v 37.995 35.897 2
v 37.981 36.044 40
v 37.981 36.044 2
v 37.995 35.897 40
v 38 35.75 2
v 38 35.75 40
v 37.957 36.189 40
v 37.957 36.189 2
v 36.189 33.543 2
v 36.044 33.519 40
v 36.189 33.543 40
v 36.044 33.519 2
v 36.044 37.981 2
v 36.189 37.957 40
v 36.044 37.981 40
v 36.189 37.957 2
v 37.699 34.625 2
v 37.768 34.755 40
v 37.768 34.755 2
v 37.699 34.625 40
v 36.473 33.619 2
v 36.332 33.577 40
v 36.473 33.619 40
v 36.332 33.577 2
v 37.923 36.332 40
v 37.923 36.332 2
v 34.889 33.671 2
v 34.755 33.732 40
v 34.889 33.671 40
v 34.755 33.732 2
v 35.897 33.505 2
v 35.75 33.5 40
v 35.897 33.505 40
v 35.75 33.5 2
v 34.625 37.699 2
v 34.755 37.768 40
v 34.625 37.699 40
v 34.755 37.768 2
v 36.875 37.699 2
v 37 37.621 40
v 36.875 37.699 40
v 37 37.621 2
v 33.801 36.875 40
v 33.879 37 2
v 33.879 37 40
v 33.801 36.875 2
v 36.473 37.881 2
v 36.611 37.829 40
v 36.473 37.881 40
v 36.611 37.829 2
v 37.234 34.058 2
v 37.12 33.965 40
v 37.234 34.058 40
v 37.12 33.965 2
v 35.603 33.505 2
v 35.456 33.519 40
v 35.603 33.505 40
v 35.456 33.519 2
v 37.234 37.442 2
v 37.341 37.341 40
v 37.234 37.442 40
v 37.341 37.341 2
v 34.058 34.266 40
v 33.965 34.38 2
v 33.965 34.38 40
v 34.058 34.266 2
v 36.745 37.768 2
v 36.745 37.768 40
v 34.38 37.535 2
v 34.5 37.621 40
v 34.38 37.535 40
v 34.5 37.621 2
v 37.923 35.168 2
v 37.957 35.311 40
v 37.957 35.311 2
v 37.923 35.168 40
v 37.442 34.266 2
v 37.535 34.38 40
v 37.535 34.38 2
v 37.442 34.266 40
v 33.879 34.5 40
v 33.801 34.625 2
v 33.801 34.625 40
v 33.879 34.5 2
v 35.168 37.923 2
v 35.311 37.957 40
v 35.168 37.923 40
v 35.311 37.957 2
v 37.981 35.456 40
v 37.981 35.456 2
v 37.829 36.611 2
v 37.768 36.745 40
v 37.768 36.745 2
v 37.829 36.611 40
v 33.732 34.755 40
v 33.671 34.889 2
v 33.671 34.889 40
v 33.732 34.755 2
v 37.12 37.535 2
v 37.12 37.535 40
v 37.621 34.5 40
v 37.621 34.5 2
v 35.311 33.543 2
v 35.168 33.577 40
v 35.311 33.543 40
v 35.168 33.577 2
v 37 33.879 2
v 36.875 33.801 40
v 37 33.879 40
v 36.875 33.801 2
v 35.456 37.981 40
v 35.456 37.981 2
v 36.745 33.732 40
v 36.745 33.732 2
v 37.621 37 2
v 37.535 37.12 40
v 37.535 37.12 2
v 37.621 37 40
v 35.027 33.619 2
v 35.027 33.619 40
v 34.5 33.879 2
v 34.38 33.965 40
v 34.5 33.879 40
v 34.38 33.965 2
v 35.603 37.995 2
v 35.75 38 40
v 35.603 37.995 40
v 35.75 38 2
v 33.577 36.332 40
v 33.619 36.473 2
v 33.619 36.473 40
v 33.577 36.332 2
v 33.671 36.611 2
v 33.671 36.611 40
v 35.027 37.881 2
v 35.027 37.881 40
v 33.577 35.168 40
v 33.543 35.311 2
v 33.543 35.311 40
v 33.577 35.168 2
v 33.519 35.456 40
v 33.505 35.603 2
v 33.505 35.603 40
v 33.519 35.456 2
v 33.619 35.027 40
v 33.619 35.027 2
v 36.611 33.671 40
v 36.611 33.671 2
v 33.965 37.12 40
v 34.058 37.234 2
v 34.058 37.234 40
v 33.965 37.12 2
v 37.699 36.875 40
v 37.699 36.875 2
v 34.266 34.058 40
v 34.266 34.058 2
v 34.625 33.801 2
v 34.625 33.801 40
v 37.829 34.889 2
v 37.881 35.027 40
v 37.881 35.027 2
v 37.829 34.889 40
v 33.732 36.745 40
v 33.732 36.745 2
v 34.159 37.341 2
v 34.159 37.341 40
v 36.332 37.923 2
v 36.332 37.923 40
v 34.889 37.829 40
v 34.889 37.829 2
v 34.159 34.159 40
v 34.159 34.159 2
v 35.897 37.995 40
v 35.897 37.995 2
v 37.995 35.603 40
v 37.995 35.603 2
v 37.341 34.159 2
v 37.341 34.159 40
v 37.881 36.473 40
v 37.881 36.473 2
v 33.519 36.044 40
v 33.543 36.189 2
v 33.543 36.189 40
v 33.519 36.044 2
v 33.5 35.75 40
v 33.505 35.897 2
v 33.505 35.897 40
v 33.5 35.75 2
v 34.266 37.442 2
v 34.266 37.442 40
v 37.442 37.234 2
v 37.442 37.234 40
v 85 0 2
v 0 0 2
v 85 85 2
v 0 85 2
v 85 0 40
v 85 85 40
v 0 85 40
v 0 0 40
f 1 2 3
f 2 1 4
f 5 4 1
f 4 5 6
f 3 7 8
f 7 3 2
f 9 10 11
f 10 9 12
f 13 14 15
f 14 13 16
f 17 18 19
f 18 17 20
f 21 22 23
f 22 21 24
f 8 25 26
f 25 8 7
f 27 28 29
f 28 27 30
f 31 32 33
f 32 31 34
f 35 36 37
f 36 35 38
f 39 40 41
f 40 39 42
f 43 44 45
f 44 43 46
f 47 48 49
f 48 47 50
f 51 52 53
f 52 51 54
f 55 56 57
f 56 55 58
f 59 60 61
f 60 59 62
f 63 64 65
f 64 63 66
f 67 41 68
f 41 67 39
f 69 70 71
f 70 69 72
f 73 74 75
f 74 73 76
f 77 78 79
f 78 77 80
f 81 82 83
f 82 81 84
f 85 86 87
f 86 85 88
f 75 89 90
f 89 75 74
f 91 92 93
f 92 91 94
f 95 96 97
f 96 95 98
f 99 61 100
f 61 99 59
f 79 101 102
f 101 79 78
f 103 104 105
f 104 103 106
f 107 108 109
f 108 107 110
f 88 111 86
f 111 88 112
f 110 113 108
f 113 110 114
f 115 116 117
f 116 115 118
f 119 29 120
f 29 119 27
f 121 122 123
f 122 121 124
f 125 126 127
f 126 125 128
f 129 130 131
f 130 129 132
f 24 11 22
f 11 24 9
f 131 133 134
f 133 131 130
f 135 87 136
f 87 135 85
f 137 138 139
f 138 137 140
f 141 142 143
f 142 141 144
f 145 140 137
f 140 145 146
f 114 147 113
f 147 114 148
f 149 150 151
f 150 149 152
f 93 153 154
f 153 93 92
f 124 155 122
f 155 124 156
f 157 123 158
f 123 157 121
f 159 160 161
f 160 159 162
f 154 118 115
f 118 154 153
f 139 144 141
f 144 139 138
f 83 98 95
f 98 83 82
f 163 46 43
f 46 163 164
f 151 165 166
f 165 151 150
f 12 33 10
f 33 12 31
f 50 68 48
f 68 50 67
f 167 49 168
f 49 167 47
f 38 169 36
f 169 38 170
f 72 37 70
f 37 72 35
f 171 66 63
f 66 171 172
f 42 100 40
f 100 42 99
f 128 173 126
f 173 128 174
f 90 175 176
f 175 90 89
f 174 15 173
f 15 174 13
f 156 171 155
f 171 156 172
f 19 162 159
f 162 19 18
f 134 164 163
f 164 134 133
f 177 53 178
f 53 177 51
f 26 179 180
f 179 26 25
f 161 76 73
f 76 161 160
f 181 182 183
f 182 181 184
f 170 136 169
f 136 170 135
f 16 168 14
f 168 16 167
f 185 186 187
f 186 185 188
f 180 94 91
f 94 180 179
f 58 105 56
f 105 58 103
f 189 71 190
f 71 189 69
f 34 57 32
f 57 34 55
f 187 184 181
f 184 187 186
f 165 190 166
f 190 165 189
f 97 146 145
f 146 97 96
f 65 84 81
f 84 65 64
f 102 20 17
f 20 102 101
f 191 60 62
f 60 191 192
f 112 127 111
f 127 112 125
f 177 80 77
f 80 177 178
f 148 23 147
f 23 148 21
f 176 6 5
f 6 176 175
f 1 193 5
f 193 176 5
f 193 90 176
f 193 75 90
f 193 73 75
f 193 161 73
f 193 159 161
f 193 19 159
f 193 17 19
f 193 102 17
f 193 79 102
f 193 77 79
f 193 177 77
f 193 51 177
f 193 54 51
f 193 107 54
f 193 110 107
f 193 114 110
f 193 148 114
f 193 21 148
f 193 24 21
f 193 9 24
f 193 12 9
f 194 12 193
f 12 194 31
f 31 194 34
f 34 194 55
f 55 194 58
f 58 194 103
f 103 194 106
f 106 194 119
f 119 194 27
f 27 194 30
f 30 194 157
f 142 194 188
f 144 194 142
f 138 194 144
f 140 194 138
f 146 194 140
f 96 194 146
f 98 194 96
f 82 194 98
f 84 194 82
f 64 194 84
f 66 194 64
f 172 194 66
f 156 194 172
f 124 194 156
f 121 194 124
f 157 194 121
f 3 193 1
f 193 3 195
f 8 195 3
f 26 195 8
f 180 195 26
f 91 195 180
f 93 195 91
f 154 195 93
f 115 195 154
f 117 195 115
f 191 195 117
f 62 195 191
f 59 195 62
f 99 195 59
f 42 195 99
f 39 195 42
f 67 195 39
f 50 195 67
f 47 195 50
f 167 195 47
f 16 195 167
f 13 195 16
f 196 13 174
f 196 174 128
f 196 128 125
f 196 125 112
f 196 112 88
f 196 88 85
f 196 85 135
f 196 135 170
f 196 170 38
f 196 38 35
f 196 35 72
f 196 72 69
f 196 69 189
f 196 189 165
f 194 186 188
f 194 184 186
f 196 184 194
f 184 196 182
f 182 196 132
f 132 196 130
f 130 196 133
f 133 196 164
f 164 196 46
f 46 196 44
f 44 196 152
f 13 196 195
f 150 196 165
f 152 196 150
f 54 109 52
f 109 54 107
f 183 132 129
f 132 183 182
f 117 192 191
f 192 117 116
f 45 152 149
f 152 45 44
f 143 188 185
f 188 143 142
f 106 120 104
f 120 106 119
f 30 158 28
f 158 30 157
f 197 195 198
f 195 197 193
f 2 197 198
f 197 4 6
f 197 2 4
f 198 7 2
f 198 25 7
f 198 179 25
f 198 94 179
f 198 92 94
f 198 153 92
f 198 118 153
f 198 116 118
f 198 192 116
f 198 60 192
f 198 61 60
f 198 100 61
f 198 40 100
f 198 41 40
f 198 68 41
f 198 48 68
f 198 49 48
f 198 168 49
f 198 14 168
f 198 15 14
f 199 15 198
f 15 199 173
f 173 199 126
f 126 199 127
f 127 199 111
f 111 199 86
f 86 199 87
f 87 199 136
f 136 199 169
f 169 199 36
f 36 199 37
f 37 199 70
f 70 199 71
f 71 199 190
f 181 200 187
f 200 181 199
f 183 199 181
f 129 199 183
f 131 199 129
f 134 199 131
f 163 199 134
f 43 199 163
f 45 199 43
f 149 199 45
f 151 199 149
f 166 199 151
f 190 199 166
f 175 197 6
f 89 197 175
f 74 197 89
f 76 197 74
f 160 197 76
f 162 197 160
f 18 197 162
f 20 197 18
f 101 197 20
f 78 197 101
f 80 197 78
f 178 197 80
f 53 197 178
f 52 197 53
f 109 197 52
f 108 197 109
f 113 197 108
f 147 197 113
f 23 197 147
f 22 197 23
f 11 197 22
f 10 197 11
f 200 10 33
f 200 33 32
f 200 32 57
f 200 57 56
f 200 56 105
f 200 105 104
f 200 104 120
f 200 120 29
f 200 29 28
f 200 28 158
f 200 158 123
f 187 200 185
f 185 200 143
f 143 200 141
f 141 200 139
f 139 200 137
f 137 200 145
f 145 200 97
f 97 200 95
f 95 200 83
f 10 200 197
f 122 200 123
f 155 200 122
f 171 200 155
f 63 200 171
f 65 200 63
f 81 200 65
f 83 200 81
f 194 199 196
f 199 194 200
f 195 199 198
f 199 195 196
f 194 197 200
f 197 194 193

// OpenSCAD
// Magnetic stirrer housing for 80 mm PC case fan
// Print orientation: closed top plate on bed, open bottom facing up

// ---------- Parameters ----------
fan_o     = 80;    // fan outer diameter
plate_t   = 2;     // top plate thickness
wall_t    = 2.5;   // wall thickness
height    = 40;    // outer height (z = 0 to 40)
screw_d   = 4.5;   // M4 screw hole diameter
screw_p   = 71.5;  // screw hole square pitch
notch_w   = 12;    // cable notch width
notch_h   = 8;     // cable notch depth from open edge
eps       = 0.5;   // cutter overshoot

$fn = 96;

// ---------- Model ----------
difference() {
    // Outer block
    cube([fan_o + 2 * wall_t, fan_o + 2 * wall_t, height]);

    // Top plate (z = 0 to 2)
    cube([fan_o + 2 * wall_t, fan_o + 2 * wall_t, plate_t]);

    // Four screw holes through upper walls
    for (i = [-1, 1])
        for (j = [-1, 1])
            translate([i * screw_p / 2, j * screw_p / 2, plate_t])
                cylinder(d = screw_d, h = height - plate_t + eps);

    // Cable notch in +X wall, centred along Y
    translate([-fan_o / 2 - wall_t, -notch_w / 2, height - notch_h])
        cube([notch_w + 2 * wall_t, notch_w, notch_h + eps]);
}
